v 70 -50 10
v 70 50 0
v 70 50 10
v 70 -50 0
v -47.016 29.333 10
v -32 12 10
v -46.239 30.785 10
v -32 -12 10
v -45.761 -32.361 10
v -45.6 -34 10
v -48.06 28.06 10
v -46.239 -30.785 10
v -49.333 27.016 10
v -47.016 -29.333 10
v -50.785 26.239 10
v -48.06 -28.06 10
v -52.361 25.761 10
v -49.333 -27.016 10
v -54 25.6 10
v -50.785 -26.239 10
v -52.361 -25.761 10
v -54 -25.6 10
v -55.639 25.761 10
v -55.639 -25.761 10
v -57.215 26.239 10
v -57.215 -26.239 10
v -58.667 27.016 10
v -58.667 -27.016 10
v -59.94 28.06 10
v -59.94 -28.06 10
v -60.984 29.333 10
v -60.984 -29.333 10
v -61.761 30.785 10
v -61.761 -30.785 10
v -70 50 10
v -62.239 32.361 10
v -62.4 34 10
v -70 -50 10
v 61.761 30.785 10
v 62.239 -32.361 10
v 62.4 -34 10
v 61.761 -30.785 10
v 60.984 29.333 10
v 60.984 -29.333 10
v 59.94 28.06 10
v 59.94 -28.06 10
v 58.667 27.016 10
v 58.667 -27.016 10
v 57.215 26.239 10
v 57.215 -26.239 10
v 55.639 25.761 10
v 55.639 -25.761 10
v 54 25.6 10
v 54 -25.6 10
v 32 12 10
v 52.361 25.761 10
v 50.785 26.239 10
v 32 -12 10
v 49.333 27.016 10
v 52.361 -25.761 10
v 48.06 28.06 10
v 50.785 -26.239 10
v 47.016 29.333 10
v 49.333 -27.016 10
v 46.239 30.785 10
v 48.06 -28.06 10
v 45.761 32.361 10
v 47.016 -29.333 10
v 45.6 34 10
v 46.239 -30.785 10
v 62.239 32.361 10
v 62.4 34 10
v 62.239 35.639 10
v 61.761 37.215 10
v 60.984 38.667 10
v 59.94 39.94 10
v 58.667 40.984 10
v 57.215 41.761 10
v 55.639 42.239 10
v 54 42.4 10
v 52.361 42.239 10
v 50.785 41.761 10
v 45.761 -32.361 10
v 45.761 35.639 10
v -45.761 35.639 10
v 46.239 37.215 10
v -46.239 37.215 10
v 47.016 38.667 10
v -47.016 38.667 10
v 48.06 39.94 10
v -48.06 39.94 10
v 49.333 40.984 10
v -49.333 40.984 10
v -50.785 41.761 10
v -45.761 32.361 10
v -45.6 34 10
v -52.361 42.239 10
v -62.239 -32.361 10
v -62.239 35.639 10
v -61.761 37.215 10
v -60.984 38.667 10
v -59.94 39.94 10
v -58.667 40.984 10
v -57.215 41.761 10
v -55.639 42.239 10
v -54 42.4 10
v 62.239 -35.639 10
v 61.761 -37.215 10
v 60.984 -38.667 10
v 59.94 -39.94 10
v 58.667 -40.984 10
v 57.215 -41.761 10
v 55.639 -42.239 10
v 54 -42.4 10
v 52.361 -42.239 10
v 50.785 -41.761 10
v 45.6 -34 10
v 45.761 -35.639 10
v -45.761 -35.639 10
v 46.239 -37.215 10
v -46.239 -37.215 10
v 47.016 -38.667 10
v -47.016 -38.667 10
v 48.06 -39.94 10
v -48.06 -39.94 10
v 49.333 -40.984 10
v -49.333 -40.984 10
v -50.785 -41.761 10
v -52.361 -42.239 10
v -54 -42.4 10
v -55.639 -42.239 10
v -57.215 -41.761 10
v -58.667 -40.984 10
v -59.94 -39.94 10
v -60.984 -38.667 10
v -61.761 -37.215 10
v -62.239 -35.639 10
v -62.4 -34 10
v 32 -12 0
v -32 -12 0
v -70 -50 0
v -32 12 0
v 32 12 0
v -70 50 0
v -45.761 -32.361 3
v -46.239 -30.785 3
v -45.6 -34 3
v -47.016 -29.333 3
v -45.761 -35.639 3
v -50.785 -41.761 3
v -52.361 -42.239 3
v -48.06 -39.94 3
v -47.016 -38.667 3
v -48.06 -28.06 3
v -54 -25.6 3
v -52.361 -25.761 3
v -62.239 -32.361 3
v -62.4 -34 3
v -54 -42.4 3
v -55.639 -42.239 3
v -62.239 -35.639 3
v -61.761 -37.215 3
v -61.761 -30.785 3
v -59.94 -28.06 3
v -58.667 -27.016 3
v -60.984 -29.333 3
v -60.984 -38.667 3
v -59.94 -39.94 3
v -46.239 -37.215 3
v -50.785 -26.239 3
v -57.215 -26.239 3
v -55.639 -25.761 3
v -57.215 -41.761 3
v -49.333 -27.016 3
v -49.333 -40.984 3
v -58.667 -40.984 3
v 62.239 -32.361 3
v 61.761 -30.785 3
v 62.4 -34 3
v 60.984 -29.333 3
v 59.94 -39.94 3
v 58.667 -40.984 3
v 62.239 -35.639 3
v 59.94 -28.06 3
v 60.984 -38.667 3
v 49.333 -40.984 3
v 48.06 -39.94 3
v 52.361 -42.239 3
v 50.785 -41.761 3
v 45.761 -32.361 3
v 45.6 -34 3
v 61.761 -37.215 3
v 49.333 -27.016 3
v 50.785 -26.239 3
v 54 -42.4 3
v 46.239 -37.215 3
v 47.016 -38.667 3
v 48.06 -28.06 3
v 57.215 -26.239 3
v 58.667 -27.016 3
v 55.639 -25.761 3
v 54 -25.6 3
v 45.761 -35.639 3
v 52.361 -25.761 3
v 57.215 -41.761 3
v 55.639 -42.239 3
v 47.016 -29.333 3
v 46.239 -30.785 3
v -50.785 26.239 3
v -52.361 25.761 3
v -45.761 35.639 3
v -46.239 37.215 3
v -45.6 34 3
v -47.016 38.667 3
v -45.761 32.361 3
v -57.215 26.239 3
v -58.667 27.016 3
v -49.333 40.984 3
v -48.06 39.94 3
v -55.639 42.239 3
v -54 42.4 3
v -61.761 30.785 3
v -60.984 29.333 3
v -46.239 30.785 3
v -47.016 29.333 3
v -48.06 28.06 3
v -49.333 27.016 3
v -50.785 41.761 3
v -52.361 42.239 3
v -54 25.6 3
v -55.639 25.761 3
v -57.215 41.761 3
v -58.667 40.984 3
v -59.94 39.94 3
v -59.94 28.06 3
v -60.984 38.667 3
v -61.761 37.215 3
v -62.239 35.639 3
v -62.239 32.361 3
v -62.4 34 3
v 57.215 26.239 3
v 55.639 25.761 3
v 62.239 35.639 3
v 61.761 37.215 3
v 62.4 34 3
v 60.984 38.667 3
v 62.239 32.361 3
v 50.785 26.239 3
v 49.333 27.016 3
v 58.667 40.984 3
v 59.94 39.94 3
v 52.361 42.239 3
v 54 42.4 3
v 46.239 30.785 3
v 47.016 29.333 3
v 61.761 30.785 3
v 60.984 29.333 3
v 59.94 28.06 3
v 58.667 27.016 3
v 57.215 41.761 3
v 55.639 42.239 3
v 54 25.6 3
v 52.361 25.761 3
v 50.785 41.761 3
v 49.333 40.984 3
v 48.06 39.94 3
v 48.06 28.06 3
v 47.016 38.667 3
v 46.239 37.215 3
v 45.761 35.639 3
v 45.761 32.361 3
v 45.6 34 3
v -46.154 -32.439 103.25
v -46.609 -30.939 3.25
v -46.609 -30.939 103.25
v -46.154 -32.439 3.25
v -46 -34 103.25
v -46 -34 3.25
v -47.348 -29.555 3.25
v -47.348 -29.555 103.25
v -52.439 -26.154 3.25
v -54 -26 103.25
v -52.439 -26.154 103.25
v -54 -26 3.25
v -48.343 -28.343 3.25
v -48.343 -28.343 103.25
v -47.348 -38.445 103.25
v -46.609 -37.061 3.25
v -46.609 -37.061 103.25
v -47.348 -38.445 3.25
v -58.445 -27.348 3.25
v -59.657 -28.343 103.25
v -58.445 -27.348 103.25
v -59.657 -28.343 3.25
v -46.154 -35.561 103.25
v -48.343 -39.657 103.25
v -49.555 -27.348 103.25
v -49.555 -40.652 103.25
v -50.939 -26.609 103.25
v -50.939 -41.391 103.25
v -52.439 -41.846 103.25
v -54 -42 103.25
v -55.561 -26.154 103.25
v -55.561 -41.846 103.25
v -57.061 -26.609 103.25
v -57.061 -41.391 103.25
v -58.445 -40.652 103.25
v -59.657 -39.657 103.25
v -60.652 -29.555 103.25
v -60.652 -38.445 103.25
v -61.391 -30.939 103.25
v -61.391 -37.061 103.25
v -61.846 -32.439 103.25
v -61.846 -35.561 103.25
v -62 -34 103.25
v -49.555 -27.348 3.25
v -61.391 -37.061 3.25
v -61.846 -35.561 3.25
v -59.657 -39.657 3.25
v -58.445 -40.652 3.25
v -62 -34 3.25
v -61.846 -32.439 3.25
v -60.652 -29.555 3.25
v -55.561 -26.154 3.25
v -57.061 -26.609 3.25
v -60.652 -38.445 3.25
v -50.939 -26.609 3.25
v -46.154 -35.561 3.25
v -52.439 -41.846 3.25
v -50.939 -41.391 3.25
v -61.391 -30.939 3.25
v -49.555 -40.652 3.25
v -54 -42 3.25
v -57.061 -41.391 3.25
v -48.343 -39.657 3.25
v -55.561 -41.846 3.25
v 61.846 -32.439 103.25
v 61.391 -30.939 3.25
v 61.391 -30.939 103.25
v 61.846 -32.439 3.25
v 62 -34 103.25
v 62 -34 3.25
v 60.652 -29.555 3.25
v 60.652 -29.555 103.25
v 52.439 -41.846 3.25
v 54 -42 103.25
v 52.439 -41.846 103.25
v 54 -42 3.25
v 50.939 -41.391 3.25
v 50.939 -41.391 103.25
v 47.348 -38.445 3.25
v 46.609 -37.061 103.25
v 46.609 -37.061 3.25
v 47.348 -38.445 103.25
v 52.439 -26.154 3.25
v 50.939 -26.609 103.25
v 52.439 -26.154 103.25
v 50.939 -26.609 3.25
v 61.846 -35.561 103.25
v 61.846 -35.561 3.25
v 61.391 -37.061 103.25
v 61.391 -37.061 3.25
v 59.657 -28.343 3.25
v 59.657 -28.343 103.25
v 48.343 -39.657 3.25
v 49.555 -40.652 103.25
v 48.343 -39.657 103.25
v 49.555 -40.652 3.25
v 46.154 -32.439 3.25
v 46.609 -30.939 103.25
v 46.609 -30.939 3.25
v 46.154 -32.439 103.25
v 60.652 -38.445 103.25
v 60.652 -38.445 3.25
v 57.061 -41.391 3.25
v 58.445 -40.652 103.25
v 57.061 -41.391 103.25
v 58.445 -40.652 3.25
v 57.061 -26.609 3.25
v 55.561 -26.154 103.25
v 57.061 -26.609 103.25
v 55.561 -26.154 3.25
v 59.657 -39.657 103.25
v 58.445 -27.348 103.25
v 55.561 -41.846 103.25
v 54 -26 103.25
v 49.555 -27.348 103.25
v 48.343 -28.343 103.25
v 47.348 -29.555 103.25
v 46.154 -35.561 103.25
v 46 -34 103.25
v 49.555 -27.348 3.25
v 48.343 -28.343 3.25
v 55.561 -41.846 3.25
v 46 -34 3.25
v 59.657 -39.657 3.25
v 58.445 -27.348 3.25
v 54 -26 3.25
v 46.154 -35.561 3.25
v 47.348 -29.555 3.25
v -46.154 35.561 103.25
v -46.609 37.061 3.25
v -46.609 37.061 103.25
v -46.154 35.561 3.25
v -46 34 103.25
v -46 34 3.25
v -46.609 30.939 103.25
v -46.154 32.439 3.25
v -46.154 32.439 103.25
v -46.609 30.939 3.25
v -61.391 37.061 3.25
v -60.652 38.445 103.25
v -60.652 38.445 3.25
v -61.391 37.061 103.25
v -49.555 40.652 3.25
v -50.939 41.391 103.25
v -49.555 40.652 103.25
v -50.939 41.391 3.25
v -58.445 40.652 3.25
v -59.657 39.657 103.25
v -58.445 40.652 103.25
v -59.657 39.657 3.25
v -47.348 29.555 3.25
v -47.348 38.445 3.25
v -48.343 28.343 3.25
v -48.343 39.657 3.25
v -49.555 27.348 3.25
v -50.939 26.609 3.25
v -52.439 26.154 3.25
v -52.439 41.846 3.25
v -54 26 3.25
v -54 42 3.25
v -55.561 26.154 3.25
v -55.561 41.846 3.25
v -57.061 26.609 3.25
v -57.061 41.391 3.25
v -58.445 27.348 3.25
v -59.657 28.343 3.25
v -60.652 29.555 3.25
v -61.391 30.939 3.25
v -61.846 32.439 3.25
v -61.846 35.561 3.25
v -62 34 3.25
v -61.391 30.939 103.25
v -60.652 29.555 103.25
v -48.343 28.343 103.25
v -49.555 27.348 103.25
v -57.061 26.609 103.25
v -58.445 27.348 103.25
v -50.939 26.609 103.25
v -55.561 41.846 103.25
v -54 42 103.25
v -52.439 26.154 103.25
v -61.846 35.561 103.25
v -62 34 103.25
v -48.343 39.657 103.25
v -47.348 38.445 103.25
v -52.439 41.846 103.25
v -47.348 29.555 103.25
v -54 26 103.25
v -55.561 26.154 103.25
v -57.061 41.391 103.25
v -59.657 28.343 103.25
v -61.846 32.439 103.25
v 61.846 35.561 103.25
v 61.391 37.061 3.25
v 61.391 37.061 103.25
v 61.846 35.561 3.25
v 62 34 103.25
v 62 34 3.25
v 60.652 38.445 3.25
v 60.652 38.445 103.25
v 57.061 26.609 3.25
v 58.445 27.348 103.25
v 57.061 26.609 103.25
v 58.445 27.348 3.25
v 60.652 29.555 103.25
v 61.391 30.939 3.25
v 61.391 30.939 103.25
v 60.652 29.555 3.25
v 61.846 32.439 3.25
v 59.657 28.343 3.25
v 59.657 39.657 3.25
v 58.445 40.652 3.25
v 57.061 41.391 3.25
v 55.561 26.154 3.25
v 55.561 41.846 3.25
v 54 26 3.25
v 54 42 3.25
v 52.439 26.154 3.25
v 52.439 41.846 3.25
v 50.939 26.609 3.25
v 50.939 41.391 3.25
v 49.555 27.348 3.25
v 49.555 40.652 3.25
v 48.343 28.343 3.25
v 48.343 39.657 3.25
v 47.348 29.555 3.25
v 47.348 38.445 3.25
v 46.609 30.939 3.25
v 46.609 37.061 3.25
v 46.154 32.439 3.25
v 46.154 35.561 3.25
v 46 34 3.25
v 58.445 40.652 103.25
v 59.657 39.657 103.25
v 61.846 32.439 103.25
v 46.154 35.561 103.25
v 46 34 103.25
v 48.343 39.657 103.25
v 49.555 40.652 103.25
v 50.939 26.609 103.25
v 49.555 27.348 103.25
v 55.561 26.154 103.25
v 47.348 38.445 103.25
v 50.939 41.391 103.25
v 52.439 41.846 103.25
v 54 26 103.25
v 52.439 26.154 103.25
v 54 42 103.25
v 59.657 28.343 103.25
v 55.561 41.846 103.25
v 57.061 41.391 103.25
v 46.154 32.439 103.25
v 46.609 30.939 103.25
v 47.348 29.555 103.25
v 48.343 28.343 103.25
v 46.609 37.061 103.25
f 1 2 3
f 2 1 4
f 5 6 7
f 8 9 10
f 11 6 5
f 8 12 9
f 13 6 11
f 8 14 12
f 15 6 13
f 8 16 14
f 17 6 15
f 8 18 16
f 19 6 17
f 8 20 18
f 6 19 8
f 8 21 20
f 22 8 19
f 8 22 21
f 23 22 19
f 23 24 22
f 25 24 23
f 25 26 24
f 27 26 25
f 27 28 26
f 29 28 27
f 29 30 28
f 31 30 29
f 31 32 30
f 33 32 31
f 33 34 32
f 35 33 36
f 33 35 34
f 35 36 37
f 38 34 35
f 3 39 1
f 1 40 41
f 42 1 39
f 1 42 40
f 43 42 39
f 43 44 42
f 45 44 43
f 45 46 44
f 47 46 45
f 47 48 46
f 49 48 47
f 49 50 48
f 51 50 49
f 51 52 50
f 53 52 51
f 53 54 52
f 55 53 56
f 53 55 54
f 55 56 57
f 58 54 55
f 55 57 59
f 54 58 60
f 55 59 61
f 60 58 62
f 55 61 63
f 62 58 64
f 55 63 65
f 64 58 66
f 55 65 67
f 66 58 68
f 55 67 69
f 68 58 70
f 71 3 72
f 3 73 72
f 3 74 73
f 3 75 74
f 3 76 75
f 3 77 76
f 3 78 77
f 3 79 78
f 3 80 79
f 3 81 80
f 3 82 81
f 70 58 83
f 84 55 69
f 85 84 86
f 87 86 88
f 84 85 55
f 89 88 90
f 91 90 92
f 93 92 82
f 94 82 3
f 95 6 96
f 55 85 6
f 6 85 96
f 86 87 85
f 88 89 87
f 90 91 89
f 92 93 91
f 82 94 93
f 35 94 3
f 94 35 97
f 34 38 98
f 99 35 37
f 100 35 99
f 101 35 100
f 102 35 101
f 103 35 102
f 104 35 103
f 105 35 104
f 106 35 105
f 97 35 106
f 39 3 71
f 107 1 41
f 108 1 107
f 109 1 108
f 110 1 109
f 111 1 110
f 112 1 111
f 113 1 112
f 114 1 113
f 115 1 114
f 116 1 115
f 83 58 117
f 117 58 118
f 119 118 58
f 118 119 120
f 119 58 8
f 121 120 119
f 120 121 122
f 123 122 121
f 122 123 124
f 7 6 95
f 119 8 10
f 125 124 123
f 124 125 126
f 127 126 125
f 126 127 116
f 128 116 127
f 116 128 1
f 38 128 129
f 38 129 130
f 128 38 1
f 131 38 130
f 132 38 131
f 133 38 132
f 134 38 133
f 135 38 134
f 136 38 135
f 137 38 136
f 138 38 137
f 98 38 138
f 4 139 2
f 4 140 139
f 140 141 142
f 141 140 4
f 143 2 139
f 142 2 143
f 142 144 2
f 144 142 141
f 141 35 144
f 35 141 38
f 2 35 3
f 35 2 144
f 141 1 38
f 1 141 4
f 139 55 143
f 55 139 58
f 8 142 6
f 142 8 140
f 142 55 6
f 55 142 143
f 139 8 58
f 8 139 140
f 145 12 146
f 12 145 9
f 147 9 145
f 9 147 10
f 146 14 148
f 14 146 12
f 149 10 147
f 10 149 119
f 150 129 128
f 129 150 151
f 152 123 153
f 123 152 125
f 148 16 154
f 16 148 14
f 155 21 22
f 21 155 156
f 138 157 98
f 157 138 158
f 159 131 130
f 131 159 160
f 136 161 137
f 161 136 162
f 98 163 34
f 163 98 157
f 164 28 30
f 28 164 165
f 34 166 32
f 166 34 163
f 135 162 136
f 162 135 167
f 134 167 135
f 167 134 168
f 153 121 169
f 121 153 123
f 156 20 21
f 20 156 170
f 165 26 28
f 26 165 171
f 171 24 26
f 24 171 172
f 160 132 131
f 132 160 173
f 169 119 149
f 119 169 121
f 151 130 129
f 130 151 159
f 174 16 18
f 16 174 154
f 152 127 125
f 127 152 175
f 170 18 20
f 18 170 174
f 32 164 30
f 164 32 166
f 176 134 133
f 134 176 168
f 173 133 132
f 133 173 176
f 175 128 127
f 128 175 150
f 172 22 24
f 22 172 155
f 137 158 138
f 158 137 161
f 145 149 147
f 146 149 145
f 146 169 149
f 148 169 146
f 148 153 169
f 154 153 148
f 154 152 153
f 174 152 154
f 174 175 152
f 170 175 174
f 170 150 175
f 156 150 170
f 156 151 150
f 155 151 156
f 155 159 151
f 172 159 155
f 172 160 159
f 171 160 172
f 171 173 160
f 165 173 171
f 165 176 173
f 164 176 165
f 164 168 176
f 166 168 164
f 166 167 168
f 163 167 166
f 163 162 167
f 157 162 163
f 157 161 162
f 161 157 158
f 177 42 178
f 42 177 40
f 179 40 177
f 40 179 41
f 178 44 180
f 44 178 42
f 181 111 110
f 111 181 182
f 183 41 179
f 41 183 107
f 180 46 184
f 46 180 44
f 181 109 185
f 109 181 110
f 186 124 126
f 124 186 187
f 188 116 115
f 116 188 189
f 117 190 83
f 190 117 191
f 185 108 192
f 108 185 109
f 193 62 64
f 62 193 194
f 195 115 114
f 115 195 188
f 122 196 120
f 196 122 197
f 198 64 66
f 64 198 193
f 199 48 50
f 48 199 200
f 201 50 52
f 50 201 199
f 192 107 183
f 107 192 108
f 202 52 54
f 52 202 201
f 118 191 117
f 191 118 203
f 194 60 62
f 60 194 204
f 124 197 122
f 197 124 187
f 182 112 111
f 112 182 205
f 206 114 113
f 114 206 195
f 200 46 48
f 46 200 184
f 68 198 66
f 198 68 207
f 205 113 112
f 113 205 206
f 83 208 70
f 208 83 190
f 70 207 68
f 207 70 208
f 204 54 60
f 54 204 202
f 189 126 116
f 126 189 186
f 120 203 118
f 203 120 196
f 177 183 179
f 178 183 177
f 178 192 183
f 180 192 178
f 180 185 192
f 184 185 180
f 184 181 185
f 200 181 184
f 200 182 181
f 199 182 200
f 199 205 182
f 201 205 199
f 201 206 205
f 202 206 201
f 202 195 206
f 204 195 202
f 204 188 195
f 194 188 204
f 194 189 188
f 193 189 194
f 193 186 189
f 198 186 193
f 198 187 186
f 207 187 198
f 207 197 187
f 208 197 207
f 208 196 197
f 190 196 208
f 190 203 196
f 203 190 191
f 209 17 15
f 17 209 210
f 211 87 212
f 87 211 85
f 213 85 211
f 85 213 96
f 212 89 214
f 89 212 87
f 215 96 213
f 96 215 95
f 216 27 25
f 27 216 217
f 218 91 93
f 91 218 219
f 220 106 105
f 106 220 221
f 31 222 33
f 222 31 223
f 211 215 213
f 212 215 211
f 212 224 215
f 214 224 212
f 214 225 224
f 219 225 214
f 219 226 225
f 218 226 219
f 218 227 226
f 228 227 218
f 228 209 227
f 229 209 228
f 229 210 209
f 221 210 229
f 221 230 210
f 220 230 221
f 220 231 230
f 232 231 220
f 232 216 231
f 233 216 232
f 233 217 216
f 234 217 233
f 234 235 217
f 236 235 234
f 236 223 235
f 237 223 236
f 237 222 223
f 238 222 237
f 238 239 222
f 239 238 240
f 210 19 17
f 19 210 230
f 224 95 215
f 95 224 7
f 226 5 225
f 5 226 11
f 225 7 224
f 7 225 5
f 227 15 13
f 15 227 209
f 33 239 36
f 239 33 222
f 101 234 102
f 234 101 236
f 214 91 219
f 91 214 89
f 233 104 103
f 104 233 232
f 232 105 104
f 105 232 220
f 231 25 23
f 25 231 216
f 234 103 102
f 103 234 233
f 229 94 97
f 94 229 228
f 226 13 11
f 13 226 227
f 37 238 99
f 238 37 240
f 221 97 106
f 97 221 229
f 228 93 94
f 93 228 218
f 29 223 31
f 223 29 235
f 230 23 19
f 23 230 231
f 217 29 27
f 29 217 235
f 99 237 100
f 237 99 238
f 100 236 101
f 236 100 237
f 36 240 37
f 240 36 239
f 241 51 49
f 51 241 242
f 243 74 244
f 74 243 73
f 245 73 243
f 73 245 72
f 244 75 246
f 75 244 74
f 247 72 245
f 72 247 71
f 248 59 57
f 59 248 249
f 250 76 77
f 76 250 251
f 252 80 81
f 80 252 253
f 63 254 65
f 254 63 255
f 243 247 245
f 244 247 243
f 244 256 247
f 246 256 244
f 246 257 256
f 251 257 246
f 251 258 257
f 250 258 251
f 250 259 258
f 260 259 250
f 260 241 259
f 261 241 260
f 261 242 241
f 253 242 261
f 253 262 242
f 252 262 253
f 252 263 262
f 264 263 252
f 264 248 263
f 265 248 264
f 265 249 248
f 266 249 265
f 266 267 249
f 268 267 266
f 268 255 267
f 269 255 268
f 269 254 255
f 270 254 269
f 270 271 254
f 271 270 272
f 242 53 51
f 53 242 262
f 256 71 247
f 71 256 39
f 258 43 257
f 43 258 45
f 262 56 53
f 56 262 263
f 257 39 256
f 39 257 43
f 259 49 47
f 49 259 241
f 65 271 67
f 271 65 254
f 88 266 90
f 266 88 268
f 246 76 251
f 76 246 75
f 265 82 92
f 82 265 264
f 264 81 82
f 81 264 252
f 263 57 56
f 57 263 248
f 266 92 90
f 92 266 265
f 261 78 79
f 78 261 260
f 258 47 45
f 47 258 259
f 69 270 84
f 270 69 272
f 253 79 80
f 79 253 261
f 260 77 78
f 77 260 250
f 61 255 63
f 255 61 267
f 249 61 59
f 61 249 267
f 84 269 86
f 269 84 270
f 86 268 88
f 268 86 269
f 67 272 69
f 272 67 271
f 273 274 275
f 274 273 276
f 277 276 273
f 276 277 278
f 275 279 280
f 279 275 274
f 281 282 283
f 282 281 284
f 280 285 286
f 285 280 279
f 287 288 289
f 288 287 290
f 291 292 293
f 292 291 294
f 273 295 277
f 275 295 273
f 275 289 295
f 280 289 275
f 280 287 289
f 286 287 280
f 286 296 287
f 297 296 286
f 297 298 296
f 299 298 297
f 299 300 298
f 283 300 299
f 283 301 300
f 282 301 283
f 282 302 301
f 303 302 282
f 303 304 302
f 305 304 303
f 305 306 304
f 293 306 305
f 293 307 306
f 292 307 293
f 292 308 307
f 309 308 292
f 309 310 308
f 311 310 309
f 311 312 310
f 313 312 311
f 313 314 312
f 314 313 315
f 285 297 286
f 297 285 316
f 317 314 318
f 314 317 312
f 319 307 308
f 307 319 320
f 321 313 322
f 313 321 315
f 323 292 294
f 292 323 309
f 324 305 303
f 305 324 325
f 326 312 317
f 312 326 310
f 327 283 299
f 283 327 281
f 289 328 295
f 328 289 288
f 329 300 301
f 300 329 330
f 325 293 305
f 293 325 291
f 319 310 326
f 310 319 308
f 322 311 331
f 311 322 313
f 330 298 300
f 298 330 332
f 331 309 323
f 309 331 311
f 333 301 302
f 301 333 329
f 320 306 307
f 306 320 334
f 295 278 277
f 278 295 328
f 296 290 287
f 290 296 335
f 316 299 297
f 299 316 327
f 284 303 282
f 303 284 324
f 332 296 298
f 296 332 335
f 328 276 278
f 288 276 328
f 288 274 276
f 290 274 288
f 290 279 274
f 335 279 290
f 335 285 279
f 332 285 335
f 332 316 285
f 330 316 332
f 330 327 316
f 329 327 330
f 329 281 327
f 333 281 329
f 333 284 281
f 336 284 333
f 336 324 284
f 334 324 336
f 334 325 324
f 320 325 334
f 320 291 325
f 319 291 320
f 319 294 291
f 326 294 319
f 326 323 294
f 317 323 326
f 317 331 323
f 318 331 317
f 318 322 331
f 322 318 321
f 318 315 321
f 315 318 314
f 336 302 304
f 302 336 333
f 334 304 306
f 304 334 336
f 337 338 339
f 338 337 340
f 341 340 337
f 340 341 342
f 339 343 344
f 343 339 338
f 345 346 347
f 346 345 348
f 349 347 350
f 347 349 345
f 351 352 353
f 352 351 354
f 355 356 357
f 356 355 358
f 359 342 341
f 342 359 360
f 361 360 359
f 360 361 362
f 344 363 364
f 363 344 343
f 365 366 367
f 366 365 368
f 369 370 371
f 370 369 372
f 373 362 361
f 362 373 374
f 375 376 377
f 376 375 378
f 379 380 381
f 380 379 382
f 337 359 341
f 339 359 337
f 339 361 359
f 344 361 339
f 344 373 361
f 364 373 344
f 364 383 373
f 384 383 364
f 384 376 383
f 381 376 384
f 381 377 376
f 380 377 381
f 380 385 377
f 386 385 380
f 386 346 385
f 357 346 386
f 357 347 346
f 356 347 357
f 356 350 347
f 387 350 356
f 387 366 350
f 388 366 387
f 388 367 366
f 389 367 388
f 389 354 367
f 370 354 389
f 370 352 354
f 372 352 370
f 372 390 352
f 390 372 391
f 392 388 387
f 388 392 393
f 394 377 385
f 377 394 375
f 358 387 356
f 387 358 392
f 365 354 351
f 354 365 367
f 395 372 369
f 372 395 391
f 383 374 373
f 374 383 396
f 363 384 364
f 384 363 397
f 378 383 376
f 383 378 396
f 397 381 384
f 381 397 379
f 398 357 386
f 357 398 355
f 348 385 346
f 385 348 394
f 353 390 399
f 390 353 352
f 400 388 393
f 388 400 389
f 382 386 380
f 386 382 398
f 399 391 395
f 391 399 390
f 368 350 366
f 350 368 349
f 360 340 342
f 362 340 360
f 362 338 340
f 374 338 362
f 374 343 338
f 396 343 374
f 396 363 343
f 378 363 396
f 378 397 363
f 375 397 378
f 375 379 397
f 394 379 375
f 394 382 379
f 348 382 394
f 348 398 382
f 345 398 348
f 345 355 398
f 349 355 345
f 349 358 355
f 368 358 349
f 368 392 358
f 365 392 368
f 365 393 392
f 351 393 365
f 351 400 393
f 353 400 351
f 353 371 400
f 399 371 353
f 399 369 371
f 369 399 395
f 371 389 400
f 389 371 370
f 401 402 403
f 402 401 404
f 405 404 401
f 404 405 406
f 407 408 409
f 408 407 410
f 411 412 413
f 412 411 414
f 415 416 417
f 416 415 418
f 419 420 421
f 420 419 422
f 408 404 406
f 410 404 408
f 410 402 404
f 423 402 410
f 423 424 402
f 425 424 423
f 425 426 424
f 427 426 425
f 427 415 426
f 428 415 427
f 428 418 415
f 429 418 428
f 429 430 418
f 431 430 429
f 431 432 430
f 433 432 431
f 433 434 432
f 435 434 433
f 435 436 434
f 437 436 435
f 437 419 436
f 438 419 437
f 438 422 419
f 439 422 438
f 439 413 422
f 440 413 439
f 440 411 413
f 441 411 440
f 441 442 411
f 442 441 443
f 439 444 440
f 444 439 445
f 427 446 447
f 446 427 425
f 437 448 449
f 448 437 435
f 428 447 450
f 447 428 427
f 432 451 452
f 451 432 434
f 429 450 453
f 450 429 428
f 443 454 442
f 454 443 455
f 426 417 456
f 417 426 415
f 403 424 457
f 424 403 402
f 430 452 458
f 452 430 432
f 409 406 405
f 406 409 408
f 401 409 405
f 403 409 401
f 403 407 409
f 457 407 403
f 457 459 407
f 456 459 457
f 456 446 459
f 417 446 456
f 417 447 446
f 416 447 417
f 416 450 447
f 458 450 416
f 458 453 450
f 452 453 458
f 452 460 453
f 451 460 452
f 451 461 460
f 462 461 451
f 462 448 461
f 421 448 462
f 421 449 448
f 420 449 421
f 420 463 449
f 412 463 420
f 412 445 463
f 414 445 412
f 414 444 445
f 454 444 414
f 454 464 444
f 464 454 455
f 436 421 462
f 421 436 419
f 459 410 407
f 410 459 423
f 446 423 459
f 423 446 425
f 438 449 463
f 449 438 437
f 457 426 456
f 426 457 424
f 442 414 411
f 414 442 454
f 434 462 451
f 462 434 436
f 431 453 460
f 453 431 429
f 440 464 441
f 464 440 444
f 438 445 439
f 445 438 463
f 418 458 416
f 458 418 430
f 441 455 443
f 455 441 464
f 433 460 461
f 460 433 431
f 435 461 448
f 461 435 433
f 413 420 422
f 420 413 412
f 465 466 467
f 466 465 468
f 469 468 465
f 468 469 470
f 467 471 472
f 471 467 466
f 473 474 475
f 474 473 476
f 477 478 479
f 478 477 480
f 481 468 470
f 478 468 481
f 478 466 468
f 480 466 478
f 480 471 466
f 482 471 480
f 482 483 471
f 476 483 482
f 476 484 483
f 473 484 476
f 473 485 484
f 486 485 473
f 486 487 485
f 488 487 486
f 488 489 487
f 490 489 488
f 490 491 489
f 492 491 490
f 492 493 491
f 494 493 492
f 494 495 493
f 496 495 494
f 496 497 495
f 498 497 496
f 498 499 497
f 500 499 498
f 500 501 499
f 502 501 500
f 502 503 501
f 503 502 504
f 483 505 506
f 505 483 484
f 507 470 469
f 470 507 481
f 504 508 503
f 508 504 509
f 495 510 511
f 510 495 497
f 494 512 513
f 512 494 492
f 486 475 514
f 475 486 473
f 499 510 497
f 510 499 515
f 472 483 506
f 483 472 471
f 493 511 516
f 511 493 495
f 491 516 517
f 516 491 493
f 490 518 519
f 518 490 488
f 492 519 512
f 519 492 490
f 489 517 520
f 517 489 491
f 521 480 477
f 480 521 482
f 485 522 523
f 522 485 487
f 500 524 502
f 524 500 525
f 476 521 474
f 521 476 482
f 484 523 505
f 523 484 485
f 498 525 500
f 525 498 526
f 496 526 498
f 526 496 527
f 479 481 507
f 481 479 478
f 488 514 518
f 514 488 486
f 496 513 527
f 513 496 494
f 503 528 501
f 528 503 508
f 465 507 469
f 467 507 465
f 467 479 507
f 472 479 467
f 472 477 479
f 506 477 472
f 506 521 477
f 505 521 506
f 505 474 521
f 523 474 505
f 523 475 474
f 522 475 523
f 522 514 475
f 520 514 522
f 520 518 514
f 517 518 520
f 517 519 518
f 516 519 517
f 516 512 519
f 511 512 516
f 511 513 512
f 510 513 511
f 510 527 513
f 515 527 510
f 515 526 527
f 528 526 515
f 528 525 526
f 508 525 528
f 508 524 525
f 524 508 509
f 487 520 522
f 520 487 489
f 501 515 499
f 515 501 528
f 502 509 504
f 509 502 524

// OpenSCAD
$fn = 32;

// ------------------------------------------------------------------------
// Frame with four posts: 140 x 100 mm frame, four d16 posts
// Every part is its own module, assembly() places them once.
// ------------------------------------------------------------------------

// --- part 1 ---
module base_frame() {
  difference() {
    translate([-70, -50, 0]) cube([140, 100, 10]);
    translate([-32, -12, -1]) cube([64, 24, 12]);
    translate([-54, -34, 3]) cylinder(h = 8, d = 16.8);
    translate([54, -34, 3]) cylinder(h = 8, d = 16.8);
    translate([-54, 34, 3]) cylinder(h = 8, d = 16.8);
    translate([54, 34, 3]) cylinder(h = 8, d = 16.8);
  }
}

// --- part 2 ---
module post1() {
  cylinder(h = 100, d = 16);
}

// --- part 3 ---
module post2() {
  cylinder(h = 100, d = 16);
}

// --- part 4 ---
module post3() {
  cylinder(h = 100, d = 16);
}

// --- part 5 ---
module post4() {
  cylinder(h = 100, d = 16);
}

// --- assembly ---
module assembly() {
  translate([0, 0, 0]) rotate([0, 0, 0]) base_frame();
  translate([-54, -34, 3.25]) rotate([0, 0, 0]) post1();
  translate([54, -34, 3.25]) rotate([0, 0, 0]) post2();
  translate([-54, 34, 3.25]) rotate([0, 0, 0]) post3();
  translate([54, 34, 3.25]) rotate([0, 0, 0]) post4();
}

assembly();
